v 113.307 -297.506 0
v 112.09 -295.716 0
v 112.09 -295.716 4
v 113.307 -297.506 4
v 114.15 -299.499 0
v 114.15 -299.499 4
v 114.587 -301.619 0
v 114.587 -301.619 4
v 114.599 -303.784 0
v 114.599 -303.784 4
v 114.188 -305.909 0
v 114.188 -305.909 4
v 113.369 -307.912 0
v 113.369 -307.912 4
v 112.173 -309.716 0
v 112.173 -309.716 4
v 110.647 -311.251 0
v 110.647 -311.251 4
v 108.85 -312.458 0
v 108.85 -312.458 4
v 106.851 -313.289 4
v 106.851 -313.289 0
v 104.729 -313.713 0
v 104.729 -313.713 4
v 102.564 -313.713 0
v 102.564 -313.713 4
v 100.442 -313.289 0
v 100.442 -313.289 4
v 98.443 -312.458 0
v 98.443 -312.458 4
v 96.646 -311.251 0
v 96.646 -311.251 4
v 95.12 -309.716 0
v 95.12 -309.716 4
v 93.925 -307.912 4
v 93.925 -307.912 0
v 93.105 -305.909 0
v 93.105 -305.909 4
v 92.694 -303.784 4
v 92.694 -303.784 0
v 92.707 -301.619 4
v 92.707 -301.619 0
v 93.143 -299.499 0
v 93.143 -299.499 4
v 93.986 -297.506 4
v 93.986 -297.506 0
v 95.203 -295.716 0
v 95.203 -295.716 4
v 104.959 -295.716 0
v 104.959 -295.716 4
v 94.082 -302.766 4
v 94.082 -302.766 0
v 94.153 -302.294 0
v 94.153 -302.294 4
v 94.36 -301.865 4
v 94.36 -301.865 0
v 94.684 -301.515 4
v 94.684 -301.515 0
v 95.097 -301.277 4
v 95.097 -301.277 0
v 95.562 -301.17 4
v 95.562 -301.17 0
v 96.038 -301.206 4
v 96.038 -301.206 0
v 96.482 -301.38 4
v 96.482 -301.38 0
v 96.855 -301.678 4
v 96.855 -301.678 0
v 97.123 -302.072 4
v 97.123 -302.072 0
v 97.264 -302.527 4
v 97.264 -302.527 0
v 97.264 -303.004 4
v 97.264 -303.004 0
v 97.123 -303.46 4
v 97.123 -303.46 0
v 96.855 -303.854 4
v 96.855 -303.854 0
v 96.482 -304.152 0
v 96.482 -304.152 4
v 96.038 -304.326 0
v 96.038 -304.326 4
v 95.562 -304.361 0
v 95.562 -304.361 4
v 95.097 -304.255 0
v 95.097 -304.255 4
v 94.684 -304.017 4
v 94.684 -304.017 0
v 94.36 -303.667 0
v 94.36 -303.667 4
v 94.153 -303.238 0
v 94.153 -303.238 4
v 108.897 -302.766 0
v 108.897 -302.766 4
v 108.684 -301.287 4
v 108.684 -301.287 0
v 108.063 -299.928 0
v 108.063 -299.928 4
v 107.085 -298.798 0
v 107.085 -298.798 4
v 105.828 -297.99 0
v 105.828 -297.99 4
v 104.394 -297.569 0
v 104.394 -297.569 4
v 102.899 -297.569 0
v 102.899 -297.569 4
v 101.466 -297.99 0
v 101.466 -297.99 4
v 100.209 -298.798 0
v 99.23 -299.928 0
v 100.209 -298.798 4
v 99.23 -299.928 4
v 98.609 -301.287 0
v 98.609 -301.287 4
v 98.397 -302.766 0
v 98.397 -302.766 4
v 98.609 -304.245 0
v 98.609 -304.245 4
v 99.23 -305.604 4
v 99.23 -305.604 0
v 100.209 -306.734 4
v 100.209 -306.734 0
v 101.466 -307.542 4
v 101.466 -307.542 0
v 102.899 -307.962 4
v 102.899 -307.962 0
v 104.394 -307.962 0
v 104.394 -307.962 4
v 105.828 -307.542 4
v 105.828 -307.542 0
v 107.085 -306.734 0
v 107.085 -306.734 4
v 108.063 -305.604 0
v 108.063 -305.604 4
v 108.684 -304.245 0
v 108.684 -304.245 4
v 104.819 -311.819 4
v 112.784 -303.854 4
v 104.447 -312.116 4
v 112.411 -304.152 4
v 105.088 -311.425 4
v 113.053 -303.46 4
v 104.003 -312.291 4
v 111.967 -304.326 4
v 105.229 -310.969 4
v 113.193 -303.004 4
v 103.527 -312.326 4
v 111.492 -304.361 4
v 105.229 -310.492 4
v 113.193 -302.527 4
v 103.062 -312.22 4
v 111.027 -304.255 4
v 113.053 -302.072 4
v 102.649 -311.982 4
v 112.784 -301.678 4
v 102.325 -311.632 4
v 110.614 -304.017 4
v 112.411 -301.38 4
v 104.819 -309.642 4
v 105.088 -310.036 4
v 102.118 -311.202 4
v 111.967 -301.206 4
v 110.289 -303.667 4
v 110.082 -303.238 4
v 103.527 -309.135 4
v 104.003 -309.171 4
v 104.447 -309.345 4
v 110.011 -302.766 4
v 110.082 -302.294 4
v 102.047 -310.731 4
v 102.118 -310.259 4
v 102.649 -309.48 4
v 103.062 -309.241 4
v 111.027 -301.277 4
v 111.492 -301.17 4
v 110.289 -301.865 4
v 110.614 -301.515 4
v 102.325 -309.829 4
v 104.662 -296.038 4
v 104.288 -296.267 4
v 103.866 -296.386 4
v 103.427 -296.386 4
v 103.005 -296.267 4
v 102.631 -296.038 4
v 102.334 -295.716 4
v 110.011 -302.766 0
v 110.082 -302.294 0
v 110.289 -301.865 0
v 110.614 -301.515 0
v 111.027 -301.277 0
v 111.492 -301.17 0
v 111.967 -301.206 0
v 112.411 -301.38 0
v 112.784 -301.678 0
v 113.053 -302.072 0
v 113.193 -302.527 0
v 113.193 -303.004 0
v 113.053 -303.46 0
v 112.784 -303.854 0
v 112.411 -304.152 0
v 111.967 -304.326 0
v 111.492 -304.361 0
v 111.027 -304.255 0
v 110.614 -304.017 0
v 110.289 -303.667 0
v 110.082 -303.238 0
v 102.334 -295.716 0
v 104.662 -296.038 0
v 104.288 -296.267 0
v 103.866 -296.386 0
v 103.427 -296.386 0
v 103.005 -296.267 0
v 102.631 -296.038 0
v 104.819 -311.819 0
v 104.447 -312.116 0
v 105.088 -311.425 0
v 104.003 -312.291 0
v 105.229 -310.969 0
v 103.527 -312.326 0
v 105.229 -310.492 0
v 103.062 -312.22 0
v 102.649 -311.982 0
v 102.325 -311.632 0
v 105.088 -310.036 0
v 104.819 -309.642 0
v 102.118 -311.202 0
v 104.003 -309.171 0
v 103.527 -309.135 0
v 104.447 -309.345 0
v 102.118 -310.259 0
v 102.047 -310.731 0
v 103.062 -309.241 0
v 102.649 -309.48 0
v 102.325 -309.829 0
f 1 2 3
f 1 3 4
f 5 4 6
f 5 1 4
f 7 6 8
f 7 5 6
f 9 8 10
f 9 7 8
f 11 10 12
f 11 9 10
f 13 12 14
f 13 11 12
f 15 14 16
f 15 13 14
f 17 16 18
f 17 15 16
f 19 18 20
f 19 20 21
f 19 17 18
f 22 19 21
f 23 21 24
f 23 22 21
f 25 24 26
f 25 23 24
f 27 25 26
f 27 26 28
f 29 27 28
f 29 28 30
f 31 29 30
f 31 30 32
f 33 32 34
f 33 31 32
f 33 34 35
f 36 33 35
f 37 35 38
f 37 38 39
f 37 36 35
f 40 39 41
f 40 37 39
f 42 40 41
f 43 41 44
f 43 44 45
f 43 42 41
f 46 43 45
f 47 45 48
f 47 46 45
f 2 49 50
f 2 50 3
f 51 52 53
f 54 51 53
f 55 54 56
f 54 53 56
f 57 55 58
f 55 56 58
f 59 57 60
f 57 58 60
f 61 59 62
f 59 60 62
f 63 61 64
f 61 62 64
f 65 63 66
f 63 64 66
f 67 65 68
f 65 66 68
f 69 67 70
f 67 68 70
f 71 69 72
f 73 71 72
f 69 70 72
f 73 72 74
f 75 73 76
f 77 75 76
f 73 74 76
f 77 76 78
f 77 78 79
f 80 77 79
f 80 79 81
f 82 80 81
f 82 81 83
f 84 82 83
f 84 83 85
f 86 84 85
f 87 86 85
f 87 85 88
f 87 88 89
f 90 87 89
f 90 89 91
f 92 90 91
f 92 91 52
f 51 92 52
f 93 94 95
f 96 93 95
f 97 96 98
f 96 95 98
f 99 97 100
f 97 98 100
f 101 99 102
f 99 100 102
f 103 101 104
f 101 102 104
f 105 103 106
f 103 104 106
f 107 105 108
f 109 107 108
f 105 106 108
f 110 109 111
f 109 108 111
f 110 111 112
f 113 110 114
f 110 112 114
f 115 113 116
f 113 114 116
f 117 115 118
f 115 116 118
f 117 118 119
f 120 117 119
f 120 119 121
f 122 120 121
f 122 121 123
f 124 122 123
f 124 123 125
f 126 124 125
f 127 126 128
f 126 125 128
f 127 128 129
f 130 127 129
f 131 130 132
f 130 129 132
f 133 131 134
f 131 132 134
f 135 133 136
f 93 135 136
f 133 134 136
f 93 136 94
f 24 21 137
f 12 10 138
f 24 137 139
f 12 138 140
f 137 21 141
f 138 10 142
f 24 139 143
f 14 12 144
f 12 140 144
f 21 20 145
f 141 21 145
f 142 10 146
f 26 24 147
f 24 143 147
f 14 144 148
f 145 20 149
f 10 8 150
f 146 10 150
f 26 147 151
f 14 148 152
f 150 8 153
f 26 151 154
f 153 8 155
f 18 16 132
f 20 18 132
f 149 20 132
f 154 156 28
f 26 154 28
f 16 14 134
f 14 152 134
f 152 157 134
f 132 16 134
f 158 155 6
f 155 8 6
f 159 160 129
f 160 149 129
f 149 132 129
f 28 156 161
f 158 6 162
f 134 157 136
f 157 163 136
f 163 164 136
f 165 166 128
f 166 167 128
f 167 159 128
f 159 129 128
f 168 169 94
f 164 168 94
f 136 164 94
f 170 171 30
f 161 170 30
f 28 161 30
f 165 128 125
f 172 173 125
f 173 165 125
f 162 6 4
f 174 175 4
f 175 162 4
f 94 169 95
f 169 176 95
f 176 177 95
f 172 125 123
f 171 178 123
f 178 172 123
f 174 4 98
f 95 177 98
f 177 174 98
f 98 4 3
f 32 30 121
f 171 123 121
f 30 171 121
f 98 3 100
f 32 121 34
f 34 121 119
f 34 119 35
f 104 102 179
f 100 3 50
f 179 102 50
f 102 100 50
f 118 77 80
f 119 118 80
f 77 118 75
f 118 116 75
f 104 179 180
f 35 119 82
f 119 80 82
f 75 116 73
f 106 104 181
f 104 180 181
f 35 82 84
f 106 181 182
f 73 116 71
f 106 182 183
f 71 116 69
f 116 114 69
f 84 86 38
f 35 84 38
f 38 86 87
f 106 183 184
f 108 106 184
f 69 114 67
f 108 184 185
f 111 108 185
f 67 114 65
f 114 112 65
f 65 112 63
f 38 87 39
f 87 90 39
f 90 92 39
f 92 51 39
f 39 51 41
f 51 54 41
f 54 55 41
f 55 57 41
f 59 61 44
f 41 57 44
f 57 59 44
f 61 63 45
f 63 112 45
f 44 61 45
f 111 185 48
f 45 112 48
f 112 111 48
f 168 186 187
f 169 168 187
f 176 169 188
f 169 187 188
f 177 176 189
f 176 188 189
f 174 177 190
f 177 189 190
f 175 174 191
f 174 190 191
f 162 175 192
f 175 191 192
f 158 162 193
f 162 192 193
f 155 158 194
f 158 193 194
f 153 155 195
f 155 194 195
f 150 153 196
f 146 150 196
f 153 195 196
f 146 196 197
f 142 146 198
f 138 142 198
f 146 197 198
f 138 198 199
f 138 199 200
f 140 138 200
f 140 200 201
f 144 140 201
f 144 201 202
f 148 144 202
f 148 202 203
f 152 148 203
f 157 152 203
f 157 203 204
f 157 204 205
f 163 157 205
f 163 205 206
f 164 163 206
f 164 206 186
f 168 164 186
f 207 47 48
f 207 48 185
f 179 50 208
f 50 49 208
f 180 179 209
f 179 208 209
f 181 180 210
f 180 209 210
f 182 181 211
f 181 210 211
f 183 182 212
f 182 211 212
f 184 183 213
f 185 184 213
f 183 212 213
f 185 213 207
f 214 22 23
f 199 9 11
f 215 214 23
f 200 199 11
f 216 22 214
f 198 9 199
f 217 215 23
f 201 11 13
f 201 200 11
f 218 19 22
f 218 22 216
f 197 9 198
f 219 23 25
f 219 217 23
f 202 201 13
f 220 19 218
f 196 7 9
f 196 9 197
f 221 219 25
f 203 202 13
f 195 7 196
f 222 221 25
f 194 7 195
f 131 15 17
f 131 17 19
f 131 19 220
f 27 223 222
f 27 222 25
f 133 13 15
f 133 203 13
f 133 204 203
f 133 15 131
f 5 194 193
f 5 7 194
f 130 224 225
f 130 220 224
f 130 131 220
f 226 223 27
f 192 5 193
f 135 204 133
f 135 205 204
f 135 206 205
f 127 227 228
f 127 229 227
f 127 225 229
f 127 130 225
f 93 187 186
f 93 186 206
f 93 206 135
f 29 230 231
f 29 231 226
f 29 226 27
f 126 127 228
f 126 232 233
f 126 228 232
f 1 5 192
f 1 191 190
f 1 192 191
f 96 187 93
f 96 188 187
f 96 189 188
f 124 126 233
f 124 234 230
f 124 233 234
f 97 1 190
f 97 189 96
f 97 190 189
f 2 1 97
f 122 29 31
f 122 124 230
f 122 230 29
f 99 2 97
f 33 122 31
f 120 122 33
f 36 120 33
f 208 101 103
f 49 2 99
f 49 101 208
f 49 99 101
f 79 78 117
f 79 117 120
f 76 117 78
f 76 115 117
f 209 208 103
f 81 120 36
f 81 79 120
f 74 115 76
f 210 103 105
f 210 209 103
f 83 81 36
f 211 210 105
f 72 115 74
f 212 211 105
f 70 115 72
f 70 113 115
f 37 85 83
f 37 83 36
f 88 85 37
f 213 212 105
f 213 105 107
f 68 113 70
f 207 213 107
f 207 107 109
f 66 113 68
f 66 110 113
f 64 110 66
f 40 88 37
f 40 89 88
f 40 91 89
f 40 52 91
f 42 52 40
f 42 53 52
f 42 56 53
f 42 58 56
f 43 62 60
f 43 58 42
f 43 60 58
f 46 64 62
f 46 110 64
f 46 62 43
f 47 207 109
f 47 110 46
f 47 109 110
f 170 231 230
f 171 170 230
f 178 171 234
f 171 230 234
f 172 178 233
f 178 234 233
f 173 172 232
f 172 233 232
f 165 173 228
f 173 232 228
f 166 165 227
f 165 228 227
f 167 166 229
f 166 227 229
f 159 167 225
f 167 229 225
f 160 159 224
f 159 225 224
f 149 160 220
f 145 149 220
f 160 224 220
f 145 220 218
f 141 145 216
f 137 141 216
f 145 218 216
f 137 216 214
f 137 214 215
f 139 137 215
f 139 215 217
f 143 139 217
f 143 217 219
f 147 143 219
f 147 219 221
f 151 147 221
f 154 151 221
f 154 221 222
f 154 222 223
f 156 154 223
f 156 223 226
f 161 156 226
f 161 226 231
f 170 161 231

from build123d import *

# Parameters (mm, degrees)
RESSALTO_EXTRUS_O1_DEPTH = 4
ESBO_O2_R                = 5.25
CORTE_EXTRUS_O1_DEPTH    = 4
M3_CLEARANCE_HOLE1_D     = 3.2


with BuildPart() as part:
    # Esboço1 → Ressalto-extrusão1 (new body)
    with BuildSketch(Plane.XY):
        with BuildLine():
            Line((95.202808527, -295.7159332), (112.09037792, -295.7159332))
            ThreePointArc((112.09037792, -295.7159332), (103.646593224, -313.7659332), (95.202808527, -295.7159332))
        make_face()
    extrude(amount=RESSALTO_EXTRUS_O1_DEPTH)

    # Esboço2 → Corte-extrusão1 (cut)
    with BuildSketch(Plane.XY.offset(4)):
        with Locations((103.646593224, -302.7659332)):
            Circle(ESBO_O2_R)
    extrude(amount=-CORTE_EXTRUS_O1_DEPTH, mode=Mode.SUBTRACT)

    # M3 Clearance Hole1 (through all)
    with Locations(Plane.XY.offset(4)):
        with Locations((95.681870132, -302.765933199), (111.611316315, -302.765933199), (103.646593224, -310.730656291), (103.646593224, -294.801210108)):
            Hole(M3_CLEARANCE_HOLE1_D / 2)


solid = part.part
